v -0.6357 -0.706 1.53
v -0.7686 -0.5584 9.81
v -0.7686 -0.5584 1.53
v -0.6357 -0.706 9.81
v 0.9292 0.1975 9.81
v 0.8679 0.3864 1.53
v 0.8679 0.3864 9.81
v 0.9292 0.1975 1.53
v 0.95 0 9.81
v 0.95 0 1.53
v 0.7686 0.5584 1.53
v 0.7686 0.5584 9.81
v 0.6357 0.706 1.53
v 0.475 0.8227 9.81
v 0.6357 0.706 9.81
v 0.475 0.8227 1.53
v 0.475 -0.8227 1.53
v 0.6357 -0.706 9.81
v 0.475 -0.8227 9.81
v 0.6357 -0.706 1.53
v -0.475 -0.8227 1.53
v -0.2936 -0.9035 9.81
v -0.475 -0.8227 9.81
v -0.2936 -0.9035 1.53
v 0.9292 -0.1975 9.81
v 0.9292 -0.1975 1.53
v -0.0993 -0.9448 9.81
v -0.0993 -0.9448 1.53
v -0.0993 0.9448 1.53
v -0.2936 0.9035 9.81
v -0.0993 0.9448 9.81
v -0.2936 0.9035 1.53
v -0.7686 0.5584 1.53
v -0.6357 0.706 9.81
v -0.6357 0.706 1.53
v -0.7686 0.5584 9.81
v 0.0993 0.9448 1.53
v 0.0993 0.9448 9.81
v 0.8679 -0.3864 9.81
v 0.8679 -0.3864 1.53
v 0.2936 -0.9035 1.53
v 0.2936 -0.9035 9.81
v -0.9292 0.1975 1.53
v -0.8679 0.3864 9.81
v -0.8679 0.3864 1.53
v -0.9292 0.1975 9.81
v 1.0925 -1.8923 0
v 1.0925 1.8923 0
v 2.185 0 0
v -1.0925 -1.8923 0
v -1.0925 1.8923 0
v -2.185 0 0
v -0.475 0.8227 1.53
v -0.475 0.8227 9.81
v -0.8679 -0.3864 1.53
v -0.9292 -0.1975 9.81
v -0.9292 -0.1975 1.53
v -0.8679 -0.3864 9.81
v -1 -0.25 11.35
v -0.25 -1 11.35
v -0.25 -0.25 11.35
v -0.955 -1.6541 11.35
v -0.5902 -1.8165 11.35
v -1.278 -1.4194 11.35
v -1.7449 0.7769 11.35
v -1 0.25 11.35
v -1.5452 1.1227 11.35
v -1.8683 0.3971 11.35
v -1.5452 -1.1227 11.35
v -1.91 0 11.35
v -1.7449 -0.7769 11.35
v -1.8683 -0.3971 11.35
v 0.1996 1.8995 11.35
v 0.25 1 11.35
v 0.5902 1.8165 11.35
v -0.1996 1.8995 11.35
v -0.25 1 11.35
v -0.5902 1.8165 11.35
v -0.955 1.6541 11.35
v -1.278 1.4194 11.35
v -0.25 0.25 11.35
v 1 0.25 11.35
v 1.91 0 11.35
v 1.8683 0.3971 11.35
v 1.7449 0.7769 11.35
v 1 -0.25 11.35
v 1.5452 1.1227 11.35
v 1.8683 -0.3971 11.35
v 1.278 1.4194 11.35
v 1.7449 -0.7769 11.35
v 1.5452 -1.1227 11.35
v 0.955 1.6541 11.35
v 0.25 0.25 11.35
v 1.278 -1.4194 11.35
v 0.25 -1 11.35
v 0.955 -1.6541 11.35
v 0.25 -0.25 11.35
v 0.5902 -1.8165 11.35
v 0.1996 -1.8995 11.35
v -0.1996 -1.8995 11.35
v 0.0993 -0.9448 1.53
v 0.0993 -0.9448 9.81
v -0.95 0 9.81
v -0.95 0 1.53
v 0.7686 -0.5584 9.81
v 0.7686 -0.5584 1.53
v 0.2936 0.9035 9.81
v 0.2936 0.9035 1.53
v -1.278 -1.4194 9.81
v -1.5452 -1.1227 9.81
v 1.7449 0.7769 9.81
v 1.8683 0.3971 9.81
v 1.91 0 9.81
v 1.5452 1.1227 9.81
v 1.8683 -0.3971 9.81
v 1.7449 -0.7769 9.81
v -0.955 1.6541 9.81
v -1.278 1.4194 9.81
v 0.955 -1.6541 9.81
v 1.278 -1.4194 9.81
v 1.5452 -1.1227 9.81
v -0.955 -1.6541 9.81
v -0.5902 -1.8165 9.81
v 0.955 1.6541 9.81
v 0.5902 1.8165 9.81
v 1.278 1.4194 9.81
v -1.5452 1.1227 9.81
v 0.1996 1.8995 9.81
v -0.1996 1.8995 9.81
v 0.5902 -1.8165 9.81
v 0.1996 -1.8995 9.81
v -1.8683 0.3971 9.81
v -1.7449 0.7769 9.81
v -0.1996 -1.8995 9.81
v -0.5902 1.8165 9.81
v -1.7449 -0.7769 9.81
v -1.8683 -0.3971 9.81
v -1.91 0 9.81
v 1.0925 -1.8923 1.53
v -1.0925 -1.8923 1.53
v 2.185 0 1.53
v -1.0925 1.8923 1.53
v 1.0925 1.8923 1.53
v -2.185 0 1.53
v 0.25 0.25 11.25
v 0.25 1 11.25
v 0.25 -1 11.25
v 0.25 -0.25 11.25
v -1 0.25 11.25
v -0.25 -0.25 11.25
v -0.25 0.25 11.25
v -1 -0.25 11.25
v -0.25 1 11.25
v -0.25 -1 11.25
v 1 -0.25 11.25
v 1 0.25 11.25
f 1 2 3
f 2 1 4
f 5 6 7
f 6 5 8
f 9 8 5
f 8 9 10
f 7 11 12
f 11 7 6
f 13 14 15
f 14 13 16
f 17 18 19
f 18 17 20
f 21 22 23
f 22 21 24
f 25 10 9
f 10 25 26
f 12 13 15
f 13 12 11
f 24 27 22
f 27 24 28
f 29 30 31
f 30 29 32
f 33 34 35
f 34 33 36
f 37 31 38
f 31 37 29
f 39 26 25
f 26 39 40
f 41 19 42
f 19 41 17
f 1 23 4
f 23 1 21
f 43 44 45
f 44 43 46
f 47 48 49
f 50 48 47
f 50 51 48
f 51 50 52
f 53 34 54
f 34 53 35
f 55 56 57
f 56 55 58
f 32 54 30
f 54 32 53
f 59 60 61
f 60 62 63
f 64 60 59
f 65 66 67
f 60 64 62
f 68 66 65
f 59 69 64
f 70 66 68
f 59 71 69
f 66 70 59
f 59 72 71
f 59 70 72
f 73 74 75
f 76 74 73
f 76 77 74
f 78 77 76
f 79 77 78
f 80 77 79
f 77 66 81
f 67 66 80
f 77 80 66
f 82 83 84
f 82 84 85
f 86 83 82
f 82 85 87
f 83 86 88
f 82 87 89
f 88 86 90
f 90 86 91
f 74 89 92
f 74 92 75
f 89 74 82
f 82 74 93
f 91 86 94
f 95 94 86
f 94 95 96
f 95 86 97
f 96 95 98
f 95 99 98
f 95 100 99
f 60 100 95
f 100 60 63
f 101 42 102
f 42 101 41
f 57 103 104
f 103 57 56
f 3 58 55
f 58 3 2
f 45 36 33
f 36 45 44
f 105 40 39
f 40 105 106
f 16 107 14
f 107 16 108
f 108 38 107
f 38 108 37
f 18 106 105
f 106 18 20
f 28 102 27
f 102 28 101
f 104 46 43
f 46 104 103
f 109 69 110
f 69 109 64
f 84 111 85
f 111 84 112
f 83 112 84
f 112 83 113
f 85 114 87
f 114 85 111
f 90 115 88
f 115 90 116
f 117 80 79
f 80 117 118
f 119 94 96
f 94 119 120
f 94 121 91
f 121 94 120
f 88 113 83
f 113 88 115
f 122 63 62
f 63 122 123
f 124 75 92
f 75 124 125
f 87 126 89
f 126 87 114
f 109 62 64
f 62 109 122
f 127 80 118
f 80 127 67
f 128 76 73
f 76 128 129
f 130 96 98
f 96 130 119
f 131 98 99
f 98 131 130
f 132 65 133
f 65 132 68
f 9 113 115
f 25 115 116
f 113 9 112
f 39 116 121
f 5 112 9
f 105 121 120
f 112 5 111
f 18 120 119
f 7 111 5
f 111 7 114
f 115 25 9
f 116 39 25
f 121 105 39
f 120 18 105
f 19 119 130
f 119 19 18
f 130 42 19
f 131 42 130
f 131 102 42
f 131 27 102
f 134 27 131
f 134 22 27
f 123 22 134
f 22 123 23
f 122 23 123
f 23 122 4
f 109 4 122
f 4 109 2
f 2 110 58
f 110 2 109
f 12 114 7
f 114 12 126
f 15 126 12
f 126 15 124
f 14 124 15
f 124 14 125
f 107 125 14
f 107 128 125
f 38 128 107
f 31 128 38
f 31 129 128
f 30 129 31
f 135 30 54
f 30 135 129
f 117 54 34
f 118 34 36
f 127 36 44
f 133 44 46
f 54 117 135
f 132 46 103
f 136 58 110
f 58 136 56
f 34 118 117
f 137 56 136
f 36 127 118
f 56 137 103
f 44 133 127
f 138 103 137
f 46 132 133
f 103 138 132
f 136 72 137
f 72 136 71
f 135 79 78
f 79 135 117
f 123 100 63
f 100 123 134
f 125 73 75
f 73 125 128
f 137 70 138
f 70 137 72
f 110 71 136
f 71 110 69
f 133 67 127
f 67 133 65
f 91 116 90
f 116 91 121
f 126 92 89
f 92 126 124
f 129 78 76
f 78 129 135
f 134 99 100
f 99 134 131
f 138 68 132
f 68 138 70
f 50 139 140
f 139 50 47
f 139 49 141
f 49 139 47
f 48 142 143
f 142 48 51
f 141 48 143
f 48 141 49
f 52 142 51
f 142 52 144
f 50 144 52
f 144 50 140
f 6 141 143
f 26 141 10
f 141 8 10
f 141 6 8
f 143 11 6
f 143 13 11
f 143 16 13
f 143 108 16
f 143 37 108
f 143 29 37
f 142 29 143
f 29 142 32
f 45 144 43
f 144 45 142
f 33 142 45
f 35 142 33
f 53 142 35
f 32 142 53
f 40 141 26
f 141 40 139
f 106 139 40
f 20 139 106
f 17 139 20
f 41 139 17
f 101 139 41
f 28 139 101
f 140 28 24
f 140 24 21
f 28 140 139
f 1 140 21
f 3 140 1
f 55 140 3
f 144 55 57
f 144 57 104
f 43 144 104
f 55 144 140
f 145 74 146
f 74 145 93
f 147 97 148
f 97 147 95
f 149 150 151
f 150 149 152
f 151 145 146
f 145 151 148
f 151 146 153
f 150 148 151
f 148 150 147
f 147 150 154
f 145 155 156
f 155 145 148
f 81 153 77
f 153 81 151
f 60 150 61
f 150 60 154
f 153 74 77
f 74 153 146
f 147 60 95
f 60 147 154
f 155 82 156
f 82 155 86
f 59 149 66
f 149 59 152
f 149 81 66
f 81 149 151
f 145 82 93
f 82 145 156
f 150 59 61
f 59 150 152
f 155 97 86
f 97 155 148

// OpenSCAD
$fs = .2;

NUT_D = 4.37;
NUT_H = 1.53;
HEAD_D = 3.82;
HEAD_H = 1.54;
SHAFT_D = 1.90;
SHAFT_H = 11.35;

module bolt() {
  difference() {
    union() {
      cylinder(h=SHAFT_H, r=SHAFT_D / 2);
      translate([0, 0, SHAFT_H - HEAD_H])
        cylinder(h=HEAD_H, r=HEAD_D / 2);
      cylinder(h=NUT_H, r=NUT_D / 2, $fs=2.5);
    }
    translate([0, -1, SHAFT_H - HEAD_H]) {
      translate([-.5 / 2, 0, HEAD_H - .1])
        cube([.5, 2, 2]);
      translate([-1, .75, HEAD_H - .1])
        cube([2, .5, 2]);
    }
  }
}

bolt();
